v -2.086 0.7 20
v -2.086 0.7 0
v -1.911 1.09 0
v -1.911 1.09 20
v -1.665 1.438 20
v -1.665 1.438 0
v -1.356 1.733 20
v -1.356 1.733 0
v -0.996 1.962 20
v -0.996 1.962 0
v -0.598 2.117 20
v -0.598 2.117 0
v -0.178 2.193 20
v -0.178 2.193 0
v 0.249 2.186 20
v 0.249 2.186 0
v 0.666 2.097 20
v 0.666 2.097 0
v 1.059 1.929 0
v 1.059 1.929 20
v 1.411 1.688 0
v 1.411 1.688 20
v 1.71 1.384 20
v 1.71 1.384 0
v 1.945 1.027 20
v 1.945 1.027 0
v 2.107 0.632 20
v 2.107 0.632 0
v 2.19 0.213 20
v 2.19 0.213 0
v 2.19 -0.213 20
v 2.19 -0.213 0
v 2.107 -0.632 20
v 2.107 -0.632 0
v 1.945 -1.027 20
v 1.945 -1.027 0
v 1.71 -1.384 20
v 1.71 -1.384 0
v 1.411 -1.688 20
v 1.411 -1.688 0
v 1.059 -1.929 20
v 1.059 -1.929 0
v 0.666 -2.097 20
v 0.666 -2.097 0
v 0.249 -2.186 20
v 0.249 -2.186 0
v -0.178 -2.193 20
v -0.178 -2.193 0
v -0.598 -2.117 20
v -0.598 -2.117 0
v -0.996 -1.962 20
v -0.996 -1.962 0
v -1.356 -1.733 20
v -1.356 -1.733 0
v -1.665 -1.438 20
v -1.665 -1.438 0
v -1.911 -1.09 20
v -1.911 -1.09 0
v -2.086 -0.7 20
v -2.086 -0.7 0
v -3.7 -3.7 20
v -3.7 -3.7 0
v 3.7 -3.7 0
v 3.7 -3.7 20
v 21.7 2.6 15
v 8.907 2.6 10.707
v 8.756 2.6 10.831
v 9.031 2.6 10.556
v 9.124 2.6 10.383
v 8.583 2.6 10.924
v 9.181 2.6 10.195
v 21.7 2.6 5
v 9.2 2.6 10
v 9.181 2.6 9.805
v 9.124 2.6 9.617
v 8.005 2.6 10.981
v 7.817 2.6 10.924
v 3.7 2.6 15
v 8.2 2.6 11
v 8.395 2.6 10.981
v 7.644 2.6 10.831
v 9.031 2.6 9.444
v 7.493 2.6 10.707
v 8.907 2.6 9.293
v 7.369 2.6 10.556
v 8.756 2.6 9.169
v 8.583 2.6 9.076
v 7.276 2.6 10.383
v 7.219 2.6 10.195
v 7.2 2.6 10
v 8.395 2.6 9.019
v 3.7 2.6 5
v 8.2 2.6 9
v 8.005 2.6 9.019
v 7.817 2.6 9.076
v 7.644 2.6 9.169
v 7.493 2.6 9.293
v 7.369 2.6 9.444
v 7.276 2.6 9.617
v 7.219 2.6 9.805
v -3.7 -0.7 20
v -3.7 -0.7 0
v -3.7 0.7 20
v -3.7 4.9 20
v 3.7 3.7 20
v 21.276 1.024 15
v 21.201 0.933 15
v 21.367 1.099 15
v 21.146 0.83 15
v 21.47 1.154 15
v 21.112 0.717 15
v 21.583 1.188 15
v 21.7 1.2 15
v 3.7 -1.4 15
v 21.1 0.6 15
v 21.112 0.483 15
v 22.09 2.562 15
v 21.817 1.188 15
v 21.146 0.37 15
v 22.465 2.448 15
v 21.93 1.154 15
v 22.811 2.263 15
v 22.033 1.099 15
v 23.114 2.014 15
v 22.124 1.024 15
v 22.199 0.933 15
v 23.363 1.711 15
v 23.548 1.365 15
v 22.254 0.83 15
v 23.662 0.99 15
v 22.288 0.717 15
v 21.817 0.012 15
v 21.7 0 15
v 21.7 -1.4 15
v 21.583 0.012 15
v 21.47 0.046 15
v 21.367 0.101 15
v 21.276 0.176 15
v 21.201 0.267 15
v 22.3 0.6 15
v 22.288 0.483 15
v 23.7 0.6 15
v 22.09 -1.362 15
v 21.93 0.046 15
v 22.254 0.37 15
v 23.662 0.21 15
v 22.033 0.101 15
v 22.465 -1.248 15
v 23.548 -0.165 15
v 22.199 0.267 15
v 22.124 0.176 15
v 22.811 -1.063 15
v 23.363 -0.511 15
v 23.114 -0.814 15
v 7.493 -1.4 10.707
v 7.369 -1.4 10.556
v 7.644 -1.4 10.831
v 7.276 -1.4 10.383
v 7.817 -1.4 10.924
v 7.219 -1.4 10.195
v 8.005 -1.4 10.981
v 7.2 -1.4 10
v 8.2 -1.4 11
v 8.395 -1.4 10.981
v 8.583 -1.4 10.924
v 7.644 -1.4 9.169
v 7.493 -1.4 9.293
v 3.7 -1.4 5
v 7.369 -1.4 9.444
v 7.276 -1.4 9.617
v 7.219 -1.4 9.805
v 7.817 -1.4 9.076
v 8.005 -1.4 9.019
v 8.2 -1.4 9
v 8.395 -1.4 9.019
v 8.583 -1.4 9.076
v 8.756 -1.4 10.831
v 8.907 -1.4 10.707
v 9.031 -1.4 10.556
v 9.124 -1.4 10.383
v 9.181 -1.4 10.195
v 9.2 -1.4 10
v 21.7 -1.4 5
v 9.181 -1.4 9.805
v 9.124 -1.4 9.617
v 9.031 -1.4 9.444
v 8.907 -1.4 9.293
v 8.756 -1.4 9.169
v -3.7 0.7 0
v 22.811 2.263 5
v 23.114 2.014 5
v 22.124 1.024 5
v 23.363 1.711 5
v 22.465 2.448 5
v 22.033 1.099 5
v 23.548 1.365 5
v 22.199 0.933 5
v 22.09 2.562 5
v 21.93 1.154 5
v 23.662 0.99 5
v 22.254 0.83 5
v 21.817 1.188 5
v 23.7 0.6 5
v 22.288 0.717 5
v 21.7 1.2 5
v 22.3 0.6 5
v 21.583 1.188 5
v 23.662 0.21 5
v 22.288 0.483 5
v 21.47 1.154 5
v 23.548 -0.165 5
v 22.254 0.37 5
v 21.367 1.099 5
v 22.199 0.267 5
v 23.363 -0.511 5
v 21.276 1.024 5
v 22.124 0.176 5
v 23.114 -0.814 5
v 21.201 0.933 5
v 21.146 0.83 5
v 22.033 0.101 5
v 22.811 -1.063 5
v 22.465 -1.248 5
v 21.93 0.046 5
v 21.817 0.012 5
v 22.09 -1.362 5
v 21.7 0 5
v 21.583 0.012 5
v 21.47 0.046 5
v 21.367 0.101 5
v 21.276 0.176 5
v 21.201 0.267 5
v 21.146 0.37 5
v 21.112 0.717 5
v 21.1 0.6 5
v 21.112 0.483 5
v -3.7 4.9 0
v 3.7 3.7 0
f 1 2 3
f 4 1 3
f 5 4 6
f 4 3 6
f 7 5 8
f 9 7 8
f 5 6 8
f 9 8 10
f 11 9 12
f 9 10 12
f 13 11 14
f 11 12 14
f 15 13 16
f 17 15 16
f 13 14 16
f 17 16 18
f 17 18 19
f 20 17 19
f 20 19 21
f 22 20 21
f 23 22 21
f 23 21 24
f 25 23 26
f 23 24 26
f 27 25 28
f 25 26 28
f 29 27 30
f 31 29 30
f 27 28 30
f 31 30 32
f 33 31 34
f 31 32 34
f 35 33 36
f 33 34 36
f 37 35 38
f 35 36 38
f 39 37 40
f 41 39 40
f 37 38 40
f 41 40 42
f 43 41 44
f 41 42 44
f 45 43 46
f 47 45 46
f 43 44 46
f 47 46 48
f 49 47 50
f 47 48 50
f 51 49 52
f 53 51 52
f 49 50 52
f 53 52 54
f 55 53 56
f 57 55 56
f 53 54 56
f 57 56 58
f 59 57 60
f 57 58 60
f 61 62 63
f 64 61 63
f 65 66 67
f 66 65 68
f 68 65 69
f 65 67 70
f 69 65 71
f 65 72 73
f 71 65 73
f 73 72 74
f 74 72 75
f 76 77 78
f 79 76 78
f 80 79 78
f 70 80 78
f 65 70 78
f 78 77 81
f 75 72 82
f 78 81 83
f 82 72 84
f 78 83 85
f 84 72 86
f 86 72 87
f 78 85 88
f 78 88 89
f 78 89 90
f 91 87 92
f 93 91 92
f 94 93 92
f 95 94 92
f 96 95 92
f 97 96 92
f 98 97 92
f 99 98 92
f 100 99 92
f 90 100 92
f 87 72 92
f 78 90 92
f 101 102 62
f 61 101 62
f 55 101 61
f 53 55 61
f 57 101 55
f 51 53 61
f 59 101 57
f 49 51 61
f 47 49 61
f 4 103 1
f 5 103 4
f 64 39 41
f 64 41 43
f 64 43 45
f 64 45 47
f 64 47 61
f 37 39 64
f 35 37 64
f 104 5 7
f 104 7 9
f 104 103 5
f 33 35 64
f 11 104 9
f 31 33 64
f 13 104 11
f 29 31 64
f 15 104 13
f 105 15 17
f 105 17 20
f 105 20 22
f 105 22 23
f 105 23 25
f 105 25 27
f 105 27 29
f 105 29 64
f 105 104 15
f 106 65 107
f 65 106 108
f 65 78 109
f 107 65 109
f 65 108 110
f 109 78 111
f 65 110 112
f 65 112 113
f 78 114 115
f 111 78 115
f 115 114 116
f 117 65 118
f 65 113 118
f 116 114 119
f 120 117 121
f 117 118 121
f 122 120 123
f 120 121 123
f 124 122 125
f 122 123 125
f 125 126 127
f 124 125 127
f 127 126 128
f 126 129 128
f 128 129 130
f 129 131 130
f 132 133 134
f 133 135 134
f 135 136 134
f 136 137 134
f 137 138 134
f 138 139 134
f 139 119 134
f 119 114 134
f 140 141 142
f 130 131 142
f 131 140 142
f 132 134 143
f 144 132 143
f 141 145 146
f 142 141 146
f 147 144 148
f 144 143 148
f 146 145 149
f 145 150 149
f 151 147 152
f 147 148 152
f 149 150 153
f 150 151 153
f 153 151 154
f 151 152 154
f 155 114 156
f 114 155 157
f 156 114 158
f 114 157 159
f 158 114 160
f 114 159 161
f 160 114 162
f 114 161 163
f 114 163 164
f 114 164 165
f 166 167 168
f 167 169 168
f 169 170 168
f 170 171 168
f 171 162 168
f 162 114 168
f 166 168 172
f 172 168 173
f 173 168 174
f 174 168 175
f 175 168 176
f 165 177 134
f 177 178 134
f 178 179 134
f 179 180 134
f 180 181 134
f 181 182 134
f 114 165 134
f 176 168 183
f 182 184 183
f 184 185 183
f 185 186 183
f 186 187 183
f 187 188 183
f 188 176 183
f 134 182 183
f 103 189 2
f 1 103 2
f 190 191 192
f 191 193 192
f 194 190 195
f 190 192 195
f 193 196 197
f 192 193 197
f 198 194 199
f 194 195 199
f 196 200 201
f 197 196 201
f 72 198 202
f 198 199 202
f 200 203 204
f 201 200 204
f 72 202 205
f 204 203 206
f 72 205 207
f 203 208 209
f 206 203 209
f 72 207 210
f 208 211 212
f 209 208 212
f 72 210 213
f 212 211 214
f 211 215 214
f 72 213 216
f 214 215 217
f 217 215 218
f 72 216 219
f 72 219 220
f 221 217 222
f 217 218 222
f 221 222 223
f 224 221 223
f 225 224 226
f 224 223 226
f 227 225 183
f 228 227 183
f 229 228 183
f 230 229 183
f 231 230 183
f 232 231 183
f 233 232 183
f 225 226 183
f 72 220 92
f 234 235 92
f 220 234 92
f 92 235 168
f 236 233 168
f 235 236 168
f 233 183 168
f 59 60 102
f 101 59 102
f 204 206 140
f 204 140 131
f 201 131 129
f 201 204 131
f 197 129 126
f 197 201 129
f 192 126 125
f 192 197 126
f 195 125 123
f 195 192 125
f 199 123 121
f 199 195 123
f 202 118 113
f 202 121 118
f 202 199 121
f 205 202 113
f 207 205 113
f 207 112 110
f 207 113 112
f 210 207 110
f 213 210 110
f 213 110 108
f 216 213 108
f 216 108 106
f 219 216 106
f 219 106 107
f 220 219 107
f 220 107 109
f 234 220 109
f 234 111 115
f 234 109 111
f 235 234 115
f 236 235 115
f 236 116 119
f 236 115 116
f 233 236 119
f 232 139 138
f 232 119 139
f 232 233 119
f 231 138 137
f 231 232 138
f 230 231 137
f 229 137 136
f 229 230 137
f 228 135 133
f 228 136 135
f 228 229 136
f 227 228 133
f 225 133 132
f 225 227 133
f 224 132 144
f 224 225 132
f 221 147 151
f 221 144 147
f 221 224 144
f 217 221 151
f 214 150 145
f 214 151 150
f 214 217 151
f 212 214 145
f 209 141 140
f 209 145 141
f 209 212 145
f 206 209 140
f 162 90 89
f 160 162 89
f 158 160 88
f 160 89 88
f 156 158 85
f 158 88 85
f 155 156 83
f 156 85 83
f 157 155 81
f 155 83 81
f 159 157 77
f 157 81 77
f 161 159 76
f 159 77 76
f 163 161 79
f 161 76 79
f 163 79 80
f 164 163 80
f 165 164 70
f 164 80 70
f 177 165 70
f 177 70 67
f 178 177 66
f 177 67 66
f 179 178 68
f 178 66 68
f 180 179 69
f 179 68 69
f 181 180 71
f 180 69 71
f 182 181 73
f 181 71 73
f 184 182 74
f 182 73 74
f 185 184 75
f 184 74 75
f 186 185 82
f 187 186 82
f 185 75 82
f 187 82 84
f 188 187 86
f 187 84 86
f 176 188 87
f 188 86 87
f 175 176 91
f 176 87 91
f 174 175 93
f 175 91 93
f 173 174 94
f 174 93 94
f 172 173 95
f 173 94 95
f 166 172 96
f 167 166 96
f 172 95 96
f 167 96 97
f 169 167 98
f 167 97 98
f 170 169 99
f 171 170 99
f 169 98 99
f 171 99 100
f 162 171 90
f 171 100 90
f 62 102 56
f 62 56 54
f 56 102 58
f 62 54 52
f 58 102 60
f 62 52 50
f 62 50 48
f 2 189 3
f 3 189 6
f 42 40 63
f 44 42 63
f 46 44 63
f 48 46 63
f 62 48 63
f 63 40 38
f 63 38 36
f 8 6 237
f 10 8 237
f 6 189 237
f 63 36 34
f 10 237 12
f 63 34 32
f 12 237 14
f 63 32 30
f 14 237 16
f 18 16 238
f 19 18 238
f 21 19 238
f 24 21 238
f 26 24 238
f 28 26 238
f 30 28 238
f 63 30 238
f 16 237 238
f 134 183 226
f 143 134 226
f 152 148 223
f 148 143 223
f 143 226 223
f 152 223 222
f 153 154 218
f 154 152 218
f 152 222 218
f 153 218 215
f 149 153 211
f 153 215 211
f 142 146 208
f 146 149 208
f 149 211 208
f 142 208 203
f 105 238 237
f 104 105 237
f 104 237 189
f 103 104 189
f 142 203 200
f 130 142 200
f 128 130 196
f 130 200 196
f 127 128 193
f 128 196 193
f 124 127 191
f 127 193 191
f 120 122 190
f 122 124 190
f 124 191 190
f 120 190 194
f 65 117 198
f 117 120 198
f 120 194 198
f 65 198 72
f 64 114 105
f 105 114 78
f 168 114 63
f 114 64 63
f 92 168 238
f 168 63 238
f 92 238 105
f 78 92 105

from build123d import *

# Parameters (mm, degrees)
F0_R     = 0.6
F1_DEPTH = 20
F2_W     = 18
F2_H     = 5
F2_W_2   = 2
F3_DEPTH = 4
F4_R     = 1
F5_DEPTH = 4


with BuildPart() as f1:
    # F0 (on Top) → F1 (new body)
    with BuildSketch(Plane.XY):
        with BuildLine():
            ThreePointArc((-2.085665, 0.7), (2.2, 0), (-2.085665, -0.7))
            Line((-2.085665, -0.7), (-3.7, -0.7))
            Line((-3.7, -0.7), (-3.7, -3.7))
            Line((-3.7, -3.7), (3.7, -3.7))
            Line((3.7, -3.7), (3.7, -1.4))
            Line((3.7, -1.4), (21.7, -1.4))
            ThreePointArc((21.7, -1.4), (23.114214, -0.814214), (23.7, 0.6))
            ThreePointArc((23.7, 0.6), (23.114214, 2.014214), (21.7, 2.6))
            Line((21.7, 2.6), (3.7, 2.6))
            Line((3.7, 2.6), (3.7, 3.7))
            Line((3.7, 3.7), (-3.7, 4.9))
            Line((-3.7, 4.9), (-3.7, 0.7))
            Line((-3.7, 0.7), (-2.085665, 0.7))
        make_face()
        with Locations((21.7, 0.6)):
            Circle(F0_R, mode=Mode.SUBTRACT)
    extrude(amount=F1_DEPTH)

    # F2 (on face) → F3 (cut)
    with BuildSketch(Plane.XZ.offset(1.4)):
        with Locations((12.7, 2.5)):
            Rectangle(F2_W, F2_H)
        with Locations((22.7, 2.5)):
            Rectangle(F2_W_2, F2_H)
        with Locations((22.7, 17.5)):
            Rectangle(F2_W_2, F2_H)
        with Locations((12.7, 17.5)):
            Rectangle(F2_W, F2_H)
    extrude(amount=-F3_DEPTH, mode=Mode.SUBTRACT)

    # F4 (on face) → F5 (cut)
    with BuildSketch(Plane(origin=(0, 2.6, 0), x_dir=(-1, 0, 0), z_dir=(0, 1, 0))):
        with Locations((-8.2, 10)):
            Circle(F4_R)
    extrude(amount=-F5_DEPTH, mode=Mode.SUBTRACT)


solid = f1.part
